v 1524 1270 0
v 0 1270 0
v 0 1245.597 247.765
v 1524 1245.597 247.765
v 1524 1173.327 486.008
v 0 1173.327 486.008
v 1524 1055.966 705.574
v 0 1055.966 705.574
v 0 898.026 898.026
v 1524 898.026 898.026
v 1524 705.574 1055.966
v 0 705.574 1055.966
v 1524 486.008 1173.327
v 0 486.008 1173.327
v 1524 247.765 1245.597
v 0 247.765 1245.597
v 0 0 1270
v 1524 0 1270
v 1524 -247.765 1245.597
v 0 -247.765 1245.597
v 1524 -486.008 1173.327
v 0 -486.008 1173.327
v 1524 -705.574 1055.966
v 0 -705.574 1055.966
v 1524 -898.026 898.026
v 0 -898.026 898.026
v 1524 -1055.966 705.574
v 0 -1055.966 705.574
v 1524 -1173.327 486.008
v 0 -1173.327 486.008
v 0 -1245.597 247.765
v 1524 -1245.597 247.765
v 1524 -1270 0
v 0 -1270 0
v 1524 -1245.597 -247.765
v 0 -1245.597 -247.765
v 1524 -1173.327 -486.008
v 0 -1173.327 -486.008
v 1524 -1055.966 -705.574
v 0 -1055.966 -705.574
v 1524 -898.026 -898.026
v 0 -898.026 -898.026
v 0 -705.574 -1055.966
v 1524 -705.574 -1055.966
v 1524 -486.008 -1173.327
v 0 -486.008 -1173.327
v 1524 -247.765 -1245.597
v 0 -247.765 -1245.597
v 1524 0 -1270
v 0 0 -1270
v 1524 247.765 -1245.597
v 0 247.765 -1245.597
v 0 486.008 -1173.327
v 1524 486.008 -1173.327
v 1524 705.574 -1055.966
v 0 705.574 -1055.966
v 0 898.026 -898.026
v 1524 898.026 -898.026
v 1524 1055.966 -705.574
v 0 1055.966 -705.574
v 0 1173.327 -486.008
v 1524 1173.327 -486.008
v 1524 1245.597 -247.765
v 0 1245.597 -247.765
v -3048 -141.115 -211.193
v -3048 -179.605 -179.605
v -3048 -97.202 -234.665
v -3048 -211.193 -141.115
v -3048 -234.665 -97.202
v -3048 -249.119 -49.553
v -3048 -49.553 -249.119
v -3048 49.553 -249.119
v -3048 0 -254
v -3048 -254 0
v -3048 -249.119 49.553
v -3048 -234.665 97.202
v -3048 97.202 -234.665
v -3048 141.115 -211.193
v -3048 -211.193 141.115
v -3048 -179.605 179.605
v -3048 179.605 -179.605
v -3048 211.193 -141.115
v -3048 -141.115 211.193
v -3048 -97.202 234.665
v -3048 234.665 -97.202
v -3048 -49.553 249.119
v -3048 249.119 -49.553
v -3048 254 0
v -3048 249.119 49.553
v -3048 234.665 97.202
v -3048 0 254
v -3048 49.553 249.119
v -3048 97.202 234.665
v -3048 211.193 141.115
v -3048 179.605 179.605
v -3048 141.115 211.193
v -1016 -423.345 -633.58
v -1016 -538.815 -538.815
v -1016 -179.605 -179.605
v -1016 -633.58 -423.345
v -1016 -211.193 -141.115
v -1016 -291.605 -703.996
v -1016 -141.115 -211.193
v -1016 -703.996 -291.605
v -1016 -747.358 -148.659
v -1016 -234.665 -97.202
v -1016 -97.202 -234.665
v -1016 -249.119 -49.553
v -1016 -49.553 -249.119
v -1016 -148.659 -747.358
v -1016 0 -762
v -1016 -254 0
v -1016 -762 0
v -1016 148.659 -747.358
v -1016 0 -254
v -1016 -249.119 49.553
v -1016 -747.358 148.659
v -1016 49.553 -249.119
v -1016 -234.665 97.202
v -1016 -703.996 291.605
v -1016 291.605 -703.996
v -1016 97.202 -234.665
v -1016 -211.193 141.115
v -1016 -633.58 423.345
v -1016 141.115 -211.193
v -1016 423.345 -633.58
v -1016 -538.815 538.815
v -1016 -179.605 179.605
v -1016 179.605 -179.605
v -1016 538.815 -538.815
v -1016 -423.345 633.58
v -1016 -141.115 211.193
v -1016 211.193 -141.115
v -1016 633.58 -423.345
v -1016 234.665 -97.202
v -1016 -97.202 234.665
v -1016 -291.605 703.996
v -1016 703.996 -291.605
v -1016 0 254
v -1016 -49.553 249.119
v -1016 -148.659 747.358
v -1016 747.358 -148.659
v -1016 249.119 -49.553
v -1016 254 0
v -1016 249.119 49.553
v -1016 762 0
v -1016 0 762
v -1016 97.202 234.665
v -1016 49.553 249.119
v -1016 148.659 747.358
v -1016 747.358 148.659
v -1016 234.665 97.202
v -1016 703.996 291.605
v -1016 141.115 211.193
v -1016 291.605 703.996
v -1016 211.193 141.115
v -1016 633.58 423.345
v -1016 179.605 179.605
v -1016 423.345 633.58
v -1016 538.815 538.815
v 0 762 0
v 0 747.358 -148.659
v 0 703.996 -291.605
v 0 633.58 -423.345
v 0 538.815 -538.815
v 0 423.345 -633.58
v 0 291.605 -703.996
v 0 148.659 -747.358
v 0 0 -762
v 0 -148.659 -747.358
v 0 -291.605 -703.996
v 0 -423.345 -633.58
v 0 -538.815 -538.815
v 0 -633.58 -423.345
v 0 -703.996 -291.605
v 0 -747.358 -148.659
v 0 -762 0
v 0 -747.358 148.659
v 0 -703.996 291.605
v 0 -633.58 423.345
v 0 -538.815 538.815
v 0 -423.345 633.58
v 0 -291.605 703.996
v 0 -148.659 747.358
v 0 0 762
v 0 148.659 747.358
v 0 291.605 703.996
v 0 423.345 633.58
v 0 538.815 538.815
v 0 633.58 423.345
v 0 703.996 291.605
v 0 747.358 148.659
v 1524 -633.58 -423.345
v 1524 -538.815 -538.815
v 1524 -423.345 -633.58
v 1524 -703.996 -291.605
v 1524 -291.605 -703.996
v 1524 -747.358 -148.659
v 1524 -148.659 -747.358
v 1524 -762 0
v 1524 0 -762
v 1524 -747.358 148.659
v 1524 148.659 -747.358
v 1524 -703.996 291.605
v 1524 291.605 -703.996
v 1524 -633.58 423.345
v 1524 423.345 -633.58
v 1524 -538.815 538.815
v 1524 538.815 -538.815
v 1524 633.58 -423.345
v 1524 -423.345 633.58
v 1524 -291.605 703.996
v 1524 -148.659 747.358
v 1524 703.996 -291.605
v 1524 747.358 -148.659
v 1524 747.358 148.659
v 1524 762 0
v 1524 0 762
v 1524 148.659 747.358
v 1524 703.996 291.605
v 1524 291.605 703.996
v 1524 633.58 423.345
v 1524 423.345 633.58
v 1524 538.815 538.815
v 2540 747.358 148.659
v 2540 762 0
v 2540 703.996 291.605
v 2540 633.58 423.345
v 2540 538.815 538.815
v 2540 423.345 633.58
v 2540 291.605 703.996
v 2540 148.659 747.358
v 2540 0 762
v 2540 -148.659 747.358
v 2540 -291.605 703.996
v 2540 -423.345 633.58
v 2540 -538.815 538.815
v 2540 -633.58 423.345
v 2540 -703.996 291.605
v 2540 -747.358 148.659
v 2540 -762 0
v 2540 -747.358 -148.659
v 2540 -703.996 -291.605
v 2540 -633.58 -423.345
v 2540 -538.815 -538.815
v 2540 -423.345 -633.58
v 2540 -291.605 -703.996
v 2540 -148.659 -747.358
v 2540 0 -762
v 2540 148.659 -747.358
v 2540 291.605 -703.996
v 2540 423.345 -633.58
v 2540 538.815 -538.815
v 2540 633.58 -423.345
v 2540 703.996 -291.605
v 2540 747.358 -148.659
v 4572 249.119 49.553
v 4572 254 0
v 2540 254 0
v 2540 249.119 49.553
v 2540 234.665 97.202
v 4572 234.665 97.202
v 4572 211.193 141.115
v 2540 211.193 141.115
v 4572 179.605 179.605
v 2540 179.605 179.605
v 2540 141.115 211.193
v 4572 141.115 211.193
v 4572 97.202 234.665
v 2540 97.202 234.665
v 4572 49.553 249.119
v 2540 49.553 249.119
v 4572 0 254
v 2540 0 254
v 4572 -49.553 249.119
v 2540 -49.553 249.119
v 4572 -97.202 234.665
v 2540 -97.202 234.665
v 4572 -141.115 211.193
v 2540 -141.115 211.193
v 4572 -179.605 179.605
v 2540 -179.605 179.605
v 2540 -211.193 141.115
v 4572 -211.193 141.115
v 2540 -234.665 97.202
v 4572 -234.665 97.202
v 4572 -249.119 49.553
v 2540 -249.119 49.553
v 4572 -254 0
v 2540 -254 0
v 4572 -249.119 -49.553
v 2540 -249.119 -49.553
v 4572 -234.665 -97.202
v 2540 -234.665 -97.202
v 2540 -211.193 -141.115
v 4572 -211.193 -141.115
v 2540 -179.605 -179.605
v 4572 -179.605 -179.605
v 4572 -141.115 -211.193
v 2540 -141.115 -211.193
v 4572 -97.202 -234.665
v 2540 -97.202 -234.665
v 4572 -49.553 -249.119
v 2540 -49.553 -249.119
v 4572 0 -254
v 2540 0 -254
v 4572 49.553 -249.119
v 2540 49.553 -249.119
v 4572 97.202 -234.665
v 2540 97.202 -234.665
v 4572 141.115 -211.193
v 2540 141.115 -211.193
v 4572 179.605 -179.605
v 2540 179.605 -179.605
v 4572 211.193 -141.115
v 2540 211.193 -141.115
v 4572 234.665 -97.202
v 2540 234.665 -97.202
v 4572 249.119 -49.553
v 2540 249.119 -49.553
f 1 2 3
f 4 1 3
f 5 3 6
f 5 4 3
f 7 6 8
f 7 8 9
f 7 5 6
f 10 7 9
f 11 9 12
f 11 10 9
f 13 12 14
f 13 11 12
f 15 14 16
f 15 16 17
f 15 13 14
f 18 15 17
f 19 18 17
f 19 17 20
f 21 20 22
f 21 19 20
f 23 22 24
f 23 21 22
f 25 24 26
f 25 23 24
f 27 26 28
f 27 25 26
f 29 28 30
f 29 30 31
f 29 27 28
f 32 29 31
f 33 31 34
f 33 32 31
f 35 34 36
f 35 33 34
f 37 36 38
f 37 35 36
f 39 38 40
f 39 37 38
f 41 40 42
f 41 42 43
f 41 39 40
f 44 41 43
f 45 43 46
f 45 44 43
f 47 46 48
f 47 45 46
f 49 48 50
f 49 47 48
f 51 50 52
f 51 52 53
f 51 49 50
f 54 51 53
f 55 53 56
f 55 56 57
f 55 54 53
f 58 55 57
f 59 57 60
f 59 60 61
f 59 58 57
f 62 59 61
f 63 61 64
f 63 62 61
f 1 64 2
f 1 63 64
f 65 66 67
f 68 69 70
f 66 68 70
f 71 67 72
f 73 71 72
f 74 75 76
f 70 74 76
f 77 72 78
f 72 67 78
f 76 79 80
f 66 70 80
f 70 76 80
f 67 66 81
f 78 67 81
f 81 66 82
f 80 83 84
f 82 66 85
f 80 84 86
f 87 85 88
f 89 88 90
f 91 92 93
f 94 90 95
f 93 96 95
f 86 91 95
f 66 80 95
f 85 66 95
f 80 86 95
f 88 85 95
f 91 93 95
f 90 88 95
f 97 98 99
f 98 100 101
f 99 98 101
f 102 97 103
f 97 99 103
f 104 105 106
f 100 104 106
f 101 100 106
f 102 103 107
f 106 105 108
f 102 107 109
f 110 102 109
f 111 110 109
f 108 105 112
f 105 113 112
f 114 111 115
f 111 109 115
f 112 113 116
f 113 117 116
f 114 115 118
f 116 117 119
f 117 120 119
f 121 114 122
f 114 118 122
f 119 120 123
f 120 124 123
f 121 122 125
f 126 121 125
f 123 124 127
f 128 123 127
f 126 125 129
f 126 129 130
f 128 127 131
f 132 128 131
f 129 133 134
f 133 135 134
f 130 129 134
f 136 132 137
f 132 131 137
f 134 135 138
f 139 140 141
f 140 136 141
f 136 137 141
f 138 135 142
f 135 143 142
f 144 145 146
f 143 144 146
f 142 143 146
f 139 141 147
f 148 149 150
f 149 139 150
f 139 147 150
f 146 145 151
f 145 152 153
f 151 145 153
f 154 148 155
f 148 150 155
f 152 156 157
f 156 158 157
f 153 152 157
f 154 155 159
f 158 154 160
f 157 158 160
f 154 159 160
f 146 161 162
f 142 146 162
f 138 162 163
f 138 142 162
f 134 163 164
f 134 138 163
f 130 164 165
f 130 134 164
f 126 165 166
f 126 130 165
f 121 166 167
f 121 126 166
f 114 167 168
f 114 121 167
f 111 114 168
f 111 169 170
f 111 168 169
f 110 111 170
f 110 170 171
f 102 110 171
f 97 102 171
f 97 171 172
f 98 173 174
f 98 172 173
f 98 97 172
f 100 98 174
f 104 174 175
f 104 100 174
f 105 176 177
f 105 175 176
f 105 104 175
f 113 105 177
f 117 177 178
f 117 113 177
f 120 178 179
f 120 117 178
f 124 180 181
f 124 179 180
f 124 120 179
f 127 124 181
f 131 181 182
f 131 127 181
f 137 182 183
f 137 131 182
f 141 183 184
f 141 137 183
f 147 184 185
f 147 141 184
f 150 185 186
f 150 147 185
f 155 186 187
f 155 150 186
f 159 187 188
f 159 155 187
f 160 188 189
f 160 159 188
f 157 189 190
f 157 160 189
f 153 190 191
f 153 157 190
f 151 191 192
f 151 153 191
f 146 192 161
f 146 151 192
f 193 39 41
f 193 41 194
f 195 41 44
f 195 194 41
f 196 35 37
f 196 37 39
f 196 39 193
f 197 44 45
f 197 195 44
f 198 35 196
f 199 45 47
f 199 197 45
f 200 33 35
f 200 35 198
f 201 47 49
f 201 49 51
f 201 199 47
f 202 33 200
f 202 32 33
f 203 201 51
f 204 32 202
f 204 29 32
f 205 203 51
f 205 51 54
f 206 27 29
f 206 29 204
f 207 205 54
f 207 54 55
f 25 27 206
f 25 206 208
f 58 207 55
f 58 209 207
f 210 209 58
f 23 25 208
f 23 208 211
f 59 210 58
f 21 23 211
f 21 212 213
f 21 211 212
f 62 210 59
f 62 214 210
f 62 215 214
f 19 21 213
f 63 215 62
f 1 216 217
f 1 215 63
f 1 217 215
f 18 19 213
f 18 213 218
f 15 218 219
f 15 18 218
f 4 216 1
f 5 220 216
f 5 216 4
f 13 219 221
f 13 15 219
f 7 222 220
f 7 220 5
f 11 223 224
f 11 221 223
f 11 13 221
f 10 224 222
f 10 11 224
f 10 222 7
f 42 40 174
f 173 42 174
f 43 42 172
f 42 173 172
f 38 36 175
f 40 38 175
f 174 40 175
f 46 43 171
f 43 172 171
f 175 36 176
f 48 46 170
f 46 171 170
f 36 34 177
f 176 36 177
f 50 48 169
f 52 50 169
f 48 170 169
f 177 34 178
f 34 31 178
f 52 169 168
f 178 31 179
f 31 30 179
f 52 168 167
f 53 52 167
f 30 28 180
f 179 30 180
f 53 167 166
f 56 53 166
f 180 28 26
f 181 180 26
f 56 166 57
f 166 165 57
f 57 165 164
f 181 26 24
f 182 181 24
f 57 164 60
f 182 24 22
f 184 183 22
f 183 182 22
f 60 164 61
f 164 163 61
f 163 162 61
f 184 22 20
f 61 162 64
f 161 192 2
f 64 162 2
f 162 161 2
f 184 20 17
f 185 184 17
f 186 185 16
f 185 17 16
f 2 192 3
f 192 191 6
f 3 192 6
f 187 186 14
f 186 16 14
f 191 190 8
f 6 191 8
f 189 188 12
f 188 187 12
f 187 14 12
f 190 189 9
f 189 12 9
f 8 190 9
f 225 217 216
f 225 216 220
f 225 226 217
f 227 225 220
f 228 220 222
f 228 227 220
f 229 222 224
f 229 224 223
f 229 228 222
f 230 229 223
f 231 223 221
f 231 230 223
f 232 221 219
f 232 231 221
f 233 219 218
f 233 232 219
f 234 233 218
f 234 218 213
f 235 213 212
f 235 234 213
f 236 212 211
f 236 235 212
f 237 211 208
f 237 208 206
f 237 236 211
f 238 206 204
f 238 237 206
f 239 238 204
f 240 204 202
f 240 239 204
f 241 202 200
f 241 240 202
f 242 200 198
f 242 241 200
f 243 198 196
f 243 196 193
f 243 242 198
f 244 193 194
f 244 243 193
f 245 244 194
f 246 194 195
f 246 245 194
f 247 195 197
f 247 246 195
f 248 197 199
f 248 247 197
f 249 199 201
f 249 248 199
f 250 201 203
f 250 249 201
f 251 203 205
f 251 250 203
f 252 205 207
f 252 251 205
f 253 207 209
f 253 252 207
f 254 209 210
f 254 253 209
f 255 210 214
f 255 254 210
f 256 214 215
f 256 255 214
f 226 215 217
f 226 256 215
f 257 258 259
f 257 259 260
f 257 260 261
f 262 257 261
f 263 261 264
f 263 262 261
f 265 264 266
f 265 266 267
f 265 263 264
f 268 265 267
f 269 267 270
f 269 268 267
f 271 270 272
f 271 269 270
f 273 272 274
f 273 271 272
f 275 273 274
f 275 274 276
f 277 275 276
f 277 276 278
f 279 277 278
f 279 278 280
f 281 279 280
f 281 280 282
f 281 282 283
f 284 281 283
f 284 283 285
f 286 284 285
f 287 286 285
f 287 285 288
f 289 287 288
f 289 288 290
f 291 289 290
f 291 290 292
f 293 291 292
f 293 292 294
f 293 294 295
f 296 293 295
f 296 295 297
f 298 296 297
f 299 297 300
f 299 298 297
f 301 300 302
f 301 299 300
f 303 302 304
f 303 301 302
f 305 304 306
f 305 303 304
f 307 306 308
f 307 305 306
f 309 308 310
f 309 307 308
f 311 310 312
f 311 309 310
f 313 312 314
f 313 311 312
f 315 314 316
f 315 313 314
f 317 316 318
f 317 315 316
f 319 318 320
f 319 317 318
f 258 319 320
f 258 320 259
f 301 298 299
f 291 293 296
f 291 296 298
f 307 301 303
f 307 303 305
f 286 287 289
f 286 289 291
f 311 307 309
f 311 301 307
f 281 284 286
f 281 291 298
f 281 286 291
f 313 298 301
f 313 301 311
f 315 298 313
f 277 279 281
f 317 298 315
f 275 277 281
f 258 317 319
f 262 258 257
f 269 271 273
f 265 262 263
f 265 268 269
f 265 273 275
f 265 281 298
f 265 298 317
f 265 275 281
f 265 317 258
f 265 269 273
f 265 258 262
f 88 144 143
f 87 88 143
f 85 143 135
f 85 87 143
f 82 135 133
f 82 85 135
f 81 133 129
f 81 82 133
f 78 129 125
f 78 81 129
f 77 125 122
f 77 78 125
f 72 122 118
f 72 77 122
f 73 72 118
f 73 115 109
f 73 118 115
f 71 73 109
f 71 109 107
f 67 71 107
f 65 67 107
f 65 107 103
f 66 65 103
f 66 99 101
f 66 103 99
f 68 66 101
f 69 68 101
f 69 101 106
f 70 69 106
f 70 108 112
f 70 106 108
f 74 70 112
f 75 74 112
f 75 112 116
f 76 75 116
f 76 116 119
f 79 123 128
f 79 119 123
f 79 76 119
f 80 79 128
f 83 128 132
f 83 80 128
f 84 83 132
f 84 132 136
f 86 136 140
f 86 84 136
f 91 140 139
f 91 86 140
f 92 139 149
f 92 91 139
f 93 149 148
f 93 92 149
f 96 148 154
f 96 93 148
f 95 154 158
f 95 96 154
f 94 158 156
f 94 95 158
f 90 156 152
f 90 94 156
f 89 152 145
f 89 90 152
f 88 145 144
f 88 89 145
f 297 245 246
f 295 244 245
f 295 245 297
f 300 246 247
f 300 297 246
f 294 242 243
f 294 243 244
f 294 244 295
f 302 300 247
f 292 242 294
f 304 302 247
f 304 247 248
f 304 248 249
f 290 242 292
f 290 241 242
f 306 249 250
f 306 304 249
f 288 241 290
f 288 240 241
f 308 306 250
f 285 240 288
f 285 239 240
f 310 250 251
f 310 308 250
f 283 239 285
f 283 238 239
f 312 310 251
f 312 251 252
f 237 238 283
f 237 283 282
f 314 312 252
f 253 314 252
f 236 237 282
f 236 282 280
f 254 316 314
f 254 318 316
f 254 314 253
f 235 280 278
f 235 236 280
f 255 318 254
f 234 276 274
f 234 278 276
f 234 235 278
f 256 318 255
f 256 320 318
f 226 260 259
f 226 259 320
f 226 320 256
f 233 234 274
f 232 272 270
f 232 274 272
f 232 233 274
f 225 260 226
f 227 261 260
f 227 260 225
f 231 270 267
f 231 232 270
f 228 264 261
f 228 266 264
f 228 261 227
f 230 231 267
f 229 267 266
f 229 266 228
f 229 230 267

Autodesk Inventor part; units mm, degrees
ref_plane "YZ Plane" through (0, 0, 0) normal (1, 0, 0) x (0, 1, 0)
ref_plane "XZ Plane" through (0, 0, 0) normal (0, 1, 0) x (-1, 0, 0)
ref_plane "XY Plane" through (0, 0, 0) normal (0, 0, 1) x (1, 0, 0)
sketch "草圖1" plane through (0, 0, 0) normal (0, 0, 1) x (1, 0, 0)
  line L0 (0, 0) -> (0, 1270)
  line L1 (0, 1270) -> (1524, 1270)
  line L2 (1524, 1270) -> (1524, 0)
  line L3 (1524, 0) -> (1524, 762)
  line L4 (1524, 762) -> (2540, 762)
  line L5 (2540, 762) -> (2540, 0)
  line L6 (2540, 0) -> (2540, 254)
  line L7 (2540, 254) -> (4572, 254)
  line L8 (4572, 254) -> (4572, 0)
  line L9 (4572, 0) -> (0, 0)
  line L10 (762, 0) -> (762, 1270)
  line L11 (1524, 1270) -> (0, 1270)
  line L12 (0, 1270) -> (0, 0)
  line L13 (0, 0) -> (0, 762)
  line L14 (0, 762) -> (-1016, 762)
  line L15 (-1016, 762) -> (-1016, 0)
  line L16 (-1016, 0) -> (-1016, 254)
  line L17 (-1016, 254) -> (-3048, 254)
  line L18 (-3048, 254) -> (-3048, 0)
  line L19 (-3048, 0) -> (1524, 0)
  dimension "d0" = 1270
  dimension "d1" = 1524
  dimension "d2" = 762
  dimension "d3" = 1016
  dimension "d4" = 254
  dimension "d5" = 2032
revolve "迴轉1" add sketch "草圖1" angle 360 about axis through (-3048, 0, 0) along (1, 0, 0)
